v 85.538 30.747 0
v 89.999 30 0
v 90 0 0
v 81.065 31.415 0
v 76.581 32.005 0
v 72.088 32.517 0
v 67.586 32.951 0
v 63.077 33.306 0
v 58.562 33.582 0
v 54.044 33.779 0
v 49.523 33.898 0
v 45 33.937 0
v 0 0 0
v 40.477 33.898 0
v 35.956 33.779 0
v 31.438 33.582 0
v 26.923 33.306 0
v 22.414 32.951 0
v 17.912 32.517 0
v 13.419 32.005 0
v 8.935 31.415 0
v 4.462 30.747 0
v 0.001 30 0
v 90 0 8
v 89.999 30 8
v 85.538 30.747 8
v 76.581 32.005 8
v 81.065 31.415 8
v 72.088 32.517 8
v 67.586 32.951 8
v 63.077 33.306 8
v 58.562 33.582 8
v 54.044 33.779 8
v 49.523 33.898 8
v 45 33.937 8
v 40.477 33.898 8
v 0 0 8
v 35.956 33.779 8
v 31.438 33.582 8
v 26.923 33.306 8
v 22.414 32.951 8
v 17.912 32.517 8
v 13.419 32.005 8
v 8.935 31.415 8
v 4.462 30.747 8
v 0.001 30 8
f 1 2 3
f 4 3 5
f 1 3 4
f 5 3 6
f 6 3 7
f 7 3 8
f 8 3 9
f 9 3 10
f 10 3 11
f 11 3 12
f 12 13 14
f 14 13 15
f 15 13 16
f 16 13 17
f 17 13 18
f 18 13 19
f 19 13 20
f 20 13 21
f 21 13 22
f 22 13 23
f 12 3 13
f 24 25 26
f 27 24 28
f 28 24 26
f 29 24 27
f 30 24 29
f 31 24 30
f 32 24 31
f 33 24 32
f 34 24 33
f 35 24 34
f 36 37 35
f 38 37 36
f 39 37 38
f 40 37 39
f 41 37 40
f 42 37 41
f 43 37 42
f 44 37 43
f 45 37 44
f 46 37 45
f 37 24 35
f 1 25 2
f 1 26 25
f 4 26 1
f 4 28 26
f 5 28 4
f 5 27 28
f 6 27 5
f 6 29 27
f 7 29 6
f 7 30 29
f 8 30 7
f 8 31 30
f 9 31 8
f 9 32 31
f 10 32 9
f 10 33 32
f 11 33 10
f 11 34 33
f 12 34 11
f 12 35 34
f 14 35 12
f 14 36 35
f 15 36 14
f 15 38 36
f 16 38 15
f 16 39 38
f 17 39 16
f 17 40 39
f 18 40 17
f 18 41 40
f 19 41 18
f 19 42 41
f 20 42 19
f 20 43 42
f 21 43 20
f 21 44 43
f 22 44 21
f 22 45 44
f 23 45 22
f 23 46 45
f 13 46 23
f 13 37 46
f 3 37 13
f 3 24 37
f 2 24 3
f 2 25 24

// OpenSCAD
$fn = 32;

// ----------------------------------------------------------------------
// Arc profile plate: crown, 23 points
// ----------------------------------------------------------------------

// --- parameters (mm) ---
bar_l = 90;               // bar length, X
bar_w = 30;               // bar height at the ends, Y
arc_r = 259.14;           // radius of the crown arc
arc_angle = 20;           // crown arc angle, degrees
crown_rise = 3.94;        // rise of the crown over the ends
arc_step = 1;             // sampling step of the crown arc, degrees
plate_t = 8;              // plate thickness, Z

bbox_y = bar_w + crown_rise;  // full height with the crown

profile = [[89.999, 30], [85.538, 30.747], [81.065, 31.415], [76.581, 32.005], [72.088, 32.517], [67.586, 32.951], [63.077, 33.306], [58.562, 33.582], [54.044, 33.779], [49.523, 33.898], [45, 33.937], [40.477, 33.898], [35.956, 33.779], [31.438, 33.582], [26.923, 33.306], [22.414, 32.951], [17.912, 32.517], [13.419, 32.005], [8.935, 31.415], [4.462, 30.747], [0.001, 30], [0, 0], [90, 0]];  // primary outline, 23 points, counter clockwise

// --- the one profile operation ---
linear_extrude(height = plate_t) polygon(points = profile);
